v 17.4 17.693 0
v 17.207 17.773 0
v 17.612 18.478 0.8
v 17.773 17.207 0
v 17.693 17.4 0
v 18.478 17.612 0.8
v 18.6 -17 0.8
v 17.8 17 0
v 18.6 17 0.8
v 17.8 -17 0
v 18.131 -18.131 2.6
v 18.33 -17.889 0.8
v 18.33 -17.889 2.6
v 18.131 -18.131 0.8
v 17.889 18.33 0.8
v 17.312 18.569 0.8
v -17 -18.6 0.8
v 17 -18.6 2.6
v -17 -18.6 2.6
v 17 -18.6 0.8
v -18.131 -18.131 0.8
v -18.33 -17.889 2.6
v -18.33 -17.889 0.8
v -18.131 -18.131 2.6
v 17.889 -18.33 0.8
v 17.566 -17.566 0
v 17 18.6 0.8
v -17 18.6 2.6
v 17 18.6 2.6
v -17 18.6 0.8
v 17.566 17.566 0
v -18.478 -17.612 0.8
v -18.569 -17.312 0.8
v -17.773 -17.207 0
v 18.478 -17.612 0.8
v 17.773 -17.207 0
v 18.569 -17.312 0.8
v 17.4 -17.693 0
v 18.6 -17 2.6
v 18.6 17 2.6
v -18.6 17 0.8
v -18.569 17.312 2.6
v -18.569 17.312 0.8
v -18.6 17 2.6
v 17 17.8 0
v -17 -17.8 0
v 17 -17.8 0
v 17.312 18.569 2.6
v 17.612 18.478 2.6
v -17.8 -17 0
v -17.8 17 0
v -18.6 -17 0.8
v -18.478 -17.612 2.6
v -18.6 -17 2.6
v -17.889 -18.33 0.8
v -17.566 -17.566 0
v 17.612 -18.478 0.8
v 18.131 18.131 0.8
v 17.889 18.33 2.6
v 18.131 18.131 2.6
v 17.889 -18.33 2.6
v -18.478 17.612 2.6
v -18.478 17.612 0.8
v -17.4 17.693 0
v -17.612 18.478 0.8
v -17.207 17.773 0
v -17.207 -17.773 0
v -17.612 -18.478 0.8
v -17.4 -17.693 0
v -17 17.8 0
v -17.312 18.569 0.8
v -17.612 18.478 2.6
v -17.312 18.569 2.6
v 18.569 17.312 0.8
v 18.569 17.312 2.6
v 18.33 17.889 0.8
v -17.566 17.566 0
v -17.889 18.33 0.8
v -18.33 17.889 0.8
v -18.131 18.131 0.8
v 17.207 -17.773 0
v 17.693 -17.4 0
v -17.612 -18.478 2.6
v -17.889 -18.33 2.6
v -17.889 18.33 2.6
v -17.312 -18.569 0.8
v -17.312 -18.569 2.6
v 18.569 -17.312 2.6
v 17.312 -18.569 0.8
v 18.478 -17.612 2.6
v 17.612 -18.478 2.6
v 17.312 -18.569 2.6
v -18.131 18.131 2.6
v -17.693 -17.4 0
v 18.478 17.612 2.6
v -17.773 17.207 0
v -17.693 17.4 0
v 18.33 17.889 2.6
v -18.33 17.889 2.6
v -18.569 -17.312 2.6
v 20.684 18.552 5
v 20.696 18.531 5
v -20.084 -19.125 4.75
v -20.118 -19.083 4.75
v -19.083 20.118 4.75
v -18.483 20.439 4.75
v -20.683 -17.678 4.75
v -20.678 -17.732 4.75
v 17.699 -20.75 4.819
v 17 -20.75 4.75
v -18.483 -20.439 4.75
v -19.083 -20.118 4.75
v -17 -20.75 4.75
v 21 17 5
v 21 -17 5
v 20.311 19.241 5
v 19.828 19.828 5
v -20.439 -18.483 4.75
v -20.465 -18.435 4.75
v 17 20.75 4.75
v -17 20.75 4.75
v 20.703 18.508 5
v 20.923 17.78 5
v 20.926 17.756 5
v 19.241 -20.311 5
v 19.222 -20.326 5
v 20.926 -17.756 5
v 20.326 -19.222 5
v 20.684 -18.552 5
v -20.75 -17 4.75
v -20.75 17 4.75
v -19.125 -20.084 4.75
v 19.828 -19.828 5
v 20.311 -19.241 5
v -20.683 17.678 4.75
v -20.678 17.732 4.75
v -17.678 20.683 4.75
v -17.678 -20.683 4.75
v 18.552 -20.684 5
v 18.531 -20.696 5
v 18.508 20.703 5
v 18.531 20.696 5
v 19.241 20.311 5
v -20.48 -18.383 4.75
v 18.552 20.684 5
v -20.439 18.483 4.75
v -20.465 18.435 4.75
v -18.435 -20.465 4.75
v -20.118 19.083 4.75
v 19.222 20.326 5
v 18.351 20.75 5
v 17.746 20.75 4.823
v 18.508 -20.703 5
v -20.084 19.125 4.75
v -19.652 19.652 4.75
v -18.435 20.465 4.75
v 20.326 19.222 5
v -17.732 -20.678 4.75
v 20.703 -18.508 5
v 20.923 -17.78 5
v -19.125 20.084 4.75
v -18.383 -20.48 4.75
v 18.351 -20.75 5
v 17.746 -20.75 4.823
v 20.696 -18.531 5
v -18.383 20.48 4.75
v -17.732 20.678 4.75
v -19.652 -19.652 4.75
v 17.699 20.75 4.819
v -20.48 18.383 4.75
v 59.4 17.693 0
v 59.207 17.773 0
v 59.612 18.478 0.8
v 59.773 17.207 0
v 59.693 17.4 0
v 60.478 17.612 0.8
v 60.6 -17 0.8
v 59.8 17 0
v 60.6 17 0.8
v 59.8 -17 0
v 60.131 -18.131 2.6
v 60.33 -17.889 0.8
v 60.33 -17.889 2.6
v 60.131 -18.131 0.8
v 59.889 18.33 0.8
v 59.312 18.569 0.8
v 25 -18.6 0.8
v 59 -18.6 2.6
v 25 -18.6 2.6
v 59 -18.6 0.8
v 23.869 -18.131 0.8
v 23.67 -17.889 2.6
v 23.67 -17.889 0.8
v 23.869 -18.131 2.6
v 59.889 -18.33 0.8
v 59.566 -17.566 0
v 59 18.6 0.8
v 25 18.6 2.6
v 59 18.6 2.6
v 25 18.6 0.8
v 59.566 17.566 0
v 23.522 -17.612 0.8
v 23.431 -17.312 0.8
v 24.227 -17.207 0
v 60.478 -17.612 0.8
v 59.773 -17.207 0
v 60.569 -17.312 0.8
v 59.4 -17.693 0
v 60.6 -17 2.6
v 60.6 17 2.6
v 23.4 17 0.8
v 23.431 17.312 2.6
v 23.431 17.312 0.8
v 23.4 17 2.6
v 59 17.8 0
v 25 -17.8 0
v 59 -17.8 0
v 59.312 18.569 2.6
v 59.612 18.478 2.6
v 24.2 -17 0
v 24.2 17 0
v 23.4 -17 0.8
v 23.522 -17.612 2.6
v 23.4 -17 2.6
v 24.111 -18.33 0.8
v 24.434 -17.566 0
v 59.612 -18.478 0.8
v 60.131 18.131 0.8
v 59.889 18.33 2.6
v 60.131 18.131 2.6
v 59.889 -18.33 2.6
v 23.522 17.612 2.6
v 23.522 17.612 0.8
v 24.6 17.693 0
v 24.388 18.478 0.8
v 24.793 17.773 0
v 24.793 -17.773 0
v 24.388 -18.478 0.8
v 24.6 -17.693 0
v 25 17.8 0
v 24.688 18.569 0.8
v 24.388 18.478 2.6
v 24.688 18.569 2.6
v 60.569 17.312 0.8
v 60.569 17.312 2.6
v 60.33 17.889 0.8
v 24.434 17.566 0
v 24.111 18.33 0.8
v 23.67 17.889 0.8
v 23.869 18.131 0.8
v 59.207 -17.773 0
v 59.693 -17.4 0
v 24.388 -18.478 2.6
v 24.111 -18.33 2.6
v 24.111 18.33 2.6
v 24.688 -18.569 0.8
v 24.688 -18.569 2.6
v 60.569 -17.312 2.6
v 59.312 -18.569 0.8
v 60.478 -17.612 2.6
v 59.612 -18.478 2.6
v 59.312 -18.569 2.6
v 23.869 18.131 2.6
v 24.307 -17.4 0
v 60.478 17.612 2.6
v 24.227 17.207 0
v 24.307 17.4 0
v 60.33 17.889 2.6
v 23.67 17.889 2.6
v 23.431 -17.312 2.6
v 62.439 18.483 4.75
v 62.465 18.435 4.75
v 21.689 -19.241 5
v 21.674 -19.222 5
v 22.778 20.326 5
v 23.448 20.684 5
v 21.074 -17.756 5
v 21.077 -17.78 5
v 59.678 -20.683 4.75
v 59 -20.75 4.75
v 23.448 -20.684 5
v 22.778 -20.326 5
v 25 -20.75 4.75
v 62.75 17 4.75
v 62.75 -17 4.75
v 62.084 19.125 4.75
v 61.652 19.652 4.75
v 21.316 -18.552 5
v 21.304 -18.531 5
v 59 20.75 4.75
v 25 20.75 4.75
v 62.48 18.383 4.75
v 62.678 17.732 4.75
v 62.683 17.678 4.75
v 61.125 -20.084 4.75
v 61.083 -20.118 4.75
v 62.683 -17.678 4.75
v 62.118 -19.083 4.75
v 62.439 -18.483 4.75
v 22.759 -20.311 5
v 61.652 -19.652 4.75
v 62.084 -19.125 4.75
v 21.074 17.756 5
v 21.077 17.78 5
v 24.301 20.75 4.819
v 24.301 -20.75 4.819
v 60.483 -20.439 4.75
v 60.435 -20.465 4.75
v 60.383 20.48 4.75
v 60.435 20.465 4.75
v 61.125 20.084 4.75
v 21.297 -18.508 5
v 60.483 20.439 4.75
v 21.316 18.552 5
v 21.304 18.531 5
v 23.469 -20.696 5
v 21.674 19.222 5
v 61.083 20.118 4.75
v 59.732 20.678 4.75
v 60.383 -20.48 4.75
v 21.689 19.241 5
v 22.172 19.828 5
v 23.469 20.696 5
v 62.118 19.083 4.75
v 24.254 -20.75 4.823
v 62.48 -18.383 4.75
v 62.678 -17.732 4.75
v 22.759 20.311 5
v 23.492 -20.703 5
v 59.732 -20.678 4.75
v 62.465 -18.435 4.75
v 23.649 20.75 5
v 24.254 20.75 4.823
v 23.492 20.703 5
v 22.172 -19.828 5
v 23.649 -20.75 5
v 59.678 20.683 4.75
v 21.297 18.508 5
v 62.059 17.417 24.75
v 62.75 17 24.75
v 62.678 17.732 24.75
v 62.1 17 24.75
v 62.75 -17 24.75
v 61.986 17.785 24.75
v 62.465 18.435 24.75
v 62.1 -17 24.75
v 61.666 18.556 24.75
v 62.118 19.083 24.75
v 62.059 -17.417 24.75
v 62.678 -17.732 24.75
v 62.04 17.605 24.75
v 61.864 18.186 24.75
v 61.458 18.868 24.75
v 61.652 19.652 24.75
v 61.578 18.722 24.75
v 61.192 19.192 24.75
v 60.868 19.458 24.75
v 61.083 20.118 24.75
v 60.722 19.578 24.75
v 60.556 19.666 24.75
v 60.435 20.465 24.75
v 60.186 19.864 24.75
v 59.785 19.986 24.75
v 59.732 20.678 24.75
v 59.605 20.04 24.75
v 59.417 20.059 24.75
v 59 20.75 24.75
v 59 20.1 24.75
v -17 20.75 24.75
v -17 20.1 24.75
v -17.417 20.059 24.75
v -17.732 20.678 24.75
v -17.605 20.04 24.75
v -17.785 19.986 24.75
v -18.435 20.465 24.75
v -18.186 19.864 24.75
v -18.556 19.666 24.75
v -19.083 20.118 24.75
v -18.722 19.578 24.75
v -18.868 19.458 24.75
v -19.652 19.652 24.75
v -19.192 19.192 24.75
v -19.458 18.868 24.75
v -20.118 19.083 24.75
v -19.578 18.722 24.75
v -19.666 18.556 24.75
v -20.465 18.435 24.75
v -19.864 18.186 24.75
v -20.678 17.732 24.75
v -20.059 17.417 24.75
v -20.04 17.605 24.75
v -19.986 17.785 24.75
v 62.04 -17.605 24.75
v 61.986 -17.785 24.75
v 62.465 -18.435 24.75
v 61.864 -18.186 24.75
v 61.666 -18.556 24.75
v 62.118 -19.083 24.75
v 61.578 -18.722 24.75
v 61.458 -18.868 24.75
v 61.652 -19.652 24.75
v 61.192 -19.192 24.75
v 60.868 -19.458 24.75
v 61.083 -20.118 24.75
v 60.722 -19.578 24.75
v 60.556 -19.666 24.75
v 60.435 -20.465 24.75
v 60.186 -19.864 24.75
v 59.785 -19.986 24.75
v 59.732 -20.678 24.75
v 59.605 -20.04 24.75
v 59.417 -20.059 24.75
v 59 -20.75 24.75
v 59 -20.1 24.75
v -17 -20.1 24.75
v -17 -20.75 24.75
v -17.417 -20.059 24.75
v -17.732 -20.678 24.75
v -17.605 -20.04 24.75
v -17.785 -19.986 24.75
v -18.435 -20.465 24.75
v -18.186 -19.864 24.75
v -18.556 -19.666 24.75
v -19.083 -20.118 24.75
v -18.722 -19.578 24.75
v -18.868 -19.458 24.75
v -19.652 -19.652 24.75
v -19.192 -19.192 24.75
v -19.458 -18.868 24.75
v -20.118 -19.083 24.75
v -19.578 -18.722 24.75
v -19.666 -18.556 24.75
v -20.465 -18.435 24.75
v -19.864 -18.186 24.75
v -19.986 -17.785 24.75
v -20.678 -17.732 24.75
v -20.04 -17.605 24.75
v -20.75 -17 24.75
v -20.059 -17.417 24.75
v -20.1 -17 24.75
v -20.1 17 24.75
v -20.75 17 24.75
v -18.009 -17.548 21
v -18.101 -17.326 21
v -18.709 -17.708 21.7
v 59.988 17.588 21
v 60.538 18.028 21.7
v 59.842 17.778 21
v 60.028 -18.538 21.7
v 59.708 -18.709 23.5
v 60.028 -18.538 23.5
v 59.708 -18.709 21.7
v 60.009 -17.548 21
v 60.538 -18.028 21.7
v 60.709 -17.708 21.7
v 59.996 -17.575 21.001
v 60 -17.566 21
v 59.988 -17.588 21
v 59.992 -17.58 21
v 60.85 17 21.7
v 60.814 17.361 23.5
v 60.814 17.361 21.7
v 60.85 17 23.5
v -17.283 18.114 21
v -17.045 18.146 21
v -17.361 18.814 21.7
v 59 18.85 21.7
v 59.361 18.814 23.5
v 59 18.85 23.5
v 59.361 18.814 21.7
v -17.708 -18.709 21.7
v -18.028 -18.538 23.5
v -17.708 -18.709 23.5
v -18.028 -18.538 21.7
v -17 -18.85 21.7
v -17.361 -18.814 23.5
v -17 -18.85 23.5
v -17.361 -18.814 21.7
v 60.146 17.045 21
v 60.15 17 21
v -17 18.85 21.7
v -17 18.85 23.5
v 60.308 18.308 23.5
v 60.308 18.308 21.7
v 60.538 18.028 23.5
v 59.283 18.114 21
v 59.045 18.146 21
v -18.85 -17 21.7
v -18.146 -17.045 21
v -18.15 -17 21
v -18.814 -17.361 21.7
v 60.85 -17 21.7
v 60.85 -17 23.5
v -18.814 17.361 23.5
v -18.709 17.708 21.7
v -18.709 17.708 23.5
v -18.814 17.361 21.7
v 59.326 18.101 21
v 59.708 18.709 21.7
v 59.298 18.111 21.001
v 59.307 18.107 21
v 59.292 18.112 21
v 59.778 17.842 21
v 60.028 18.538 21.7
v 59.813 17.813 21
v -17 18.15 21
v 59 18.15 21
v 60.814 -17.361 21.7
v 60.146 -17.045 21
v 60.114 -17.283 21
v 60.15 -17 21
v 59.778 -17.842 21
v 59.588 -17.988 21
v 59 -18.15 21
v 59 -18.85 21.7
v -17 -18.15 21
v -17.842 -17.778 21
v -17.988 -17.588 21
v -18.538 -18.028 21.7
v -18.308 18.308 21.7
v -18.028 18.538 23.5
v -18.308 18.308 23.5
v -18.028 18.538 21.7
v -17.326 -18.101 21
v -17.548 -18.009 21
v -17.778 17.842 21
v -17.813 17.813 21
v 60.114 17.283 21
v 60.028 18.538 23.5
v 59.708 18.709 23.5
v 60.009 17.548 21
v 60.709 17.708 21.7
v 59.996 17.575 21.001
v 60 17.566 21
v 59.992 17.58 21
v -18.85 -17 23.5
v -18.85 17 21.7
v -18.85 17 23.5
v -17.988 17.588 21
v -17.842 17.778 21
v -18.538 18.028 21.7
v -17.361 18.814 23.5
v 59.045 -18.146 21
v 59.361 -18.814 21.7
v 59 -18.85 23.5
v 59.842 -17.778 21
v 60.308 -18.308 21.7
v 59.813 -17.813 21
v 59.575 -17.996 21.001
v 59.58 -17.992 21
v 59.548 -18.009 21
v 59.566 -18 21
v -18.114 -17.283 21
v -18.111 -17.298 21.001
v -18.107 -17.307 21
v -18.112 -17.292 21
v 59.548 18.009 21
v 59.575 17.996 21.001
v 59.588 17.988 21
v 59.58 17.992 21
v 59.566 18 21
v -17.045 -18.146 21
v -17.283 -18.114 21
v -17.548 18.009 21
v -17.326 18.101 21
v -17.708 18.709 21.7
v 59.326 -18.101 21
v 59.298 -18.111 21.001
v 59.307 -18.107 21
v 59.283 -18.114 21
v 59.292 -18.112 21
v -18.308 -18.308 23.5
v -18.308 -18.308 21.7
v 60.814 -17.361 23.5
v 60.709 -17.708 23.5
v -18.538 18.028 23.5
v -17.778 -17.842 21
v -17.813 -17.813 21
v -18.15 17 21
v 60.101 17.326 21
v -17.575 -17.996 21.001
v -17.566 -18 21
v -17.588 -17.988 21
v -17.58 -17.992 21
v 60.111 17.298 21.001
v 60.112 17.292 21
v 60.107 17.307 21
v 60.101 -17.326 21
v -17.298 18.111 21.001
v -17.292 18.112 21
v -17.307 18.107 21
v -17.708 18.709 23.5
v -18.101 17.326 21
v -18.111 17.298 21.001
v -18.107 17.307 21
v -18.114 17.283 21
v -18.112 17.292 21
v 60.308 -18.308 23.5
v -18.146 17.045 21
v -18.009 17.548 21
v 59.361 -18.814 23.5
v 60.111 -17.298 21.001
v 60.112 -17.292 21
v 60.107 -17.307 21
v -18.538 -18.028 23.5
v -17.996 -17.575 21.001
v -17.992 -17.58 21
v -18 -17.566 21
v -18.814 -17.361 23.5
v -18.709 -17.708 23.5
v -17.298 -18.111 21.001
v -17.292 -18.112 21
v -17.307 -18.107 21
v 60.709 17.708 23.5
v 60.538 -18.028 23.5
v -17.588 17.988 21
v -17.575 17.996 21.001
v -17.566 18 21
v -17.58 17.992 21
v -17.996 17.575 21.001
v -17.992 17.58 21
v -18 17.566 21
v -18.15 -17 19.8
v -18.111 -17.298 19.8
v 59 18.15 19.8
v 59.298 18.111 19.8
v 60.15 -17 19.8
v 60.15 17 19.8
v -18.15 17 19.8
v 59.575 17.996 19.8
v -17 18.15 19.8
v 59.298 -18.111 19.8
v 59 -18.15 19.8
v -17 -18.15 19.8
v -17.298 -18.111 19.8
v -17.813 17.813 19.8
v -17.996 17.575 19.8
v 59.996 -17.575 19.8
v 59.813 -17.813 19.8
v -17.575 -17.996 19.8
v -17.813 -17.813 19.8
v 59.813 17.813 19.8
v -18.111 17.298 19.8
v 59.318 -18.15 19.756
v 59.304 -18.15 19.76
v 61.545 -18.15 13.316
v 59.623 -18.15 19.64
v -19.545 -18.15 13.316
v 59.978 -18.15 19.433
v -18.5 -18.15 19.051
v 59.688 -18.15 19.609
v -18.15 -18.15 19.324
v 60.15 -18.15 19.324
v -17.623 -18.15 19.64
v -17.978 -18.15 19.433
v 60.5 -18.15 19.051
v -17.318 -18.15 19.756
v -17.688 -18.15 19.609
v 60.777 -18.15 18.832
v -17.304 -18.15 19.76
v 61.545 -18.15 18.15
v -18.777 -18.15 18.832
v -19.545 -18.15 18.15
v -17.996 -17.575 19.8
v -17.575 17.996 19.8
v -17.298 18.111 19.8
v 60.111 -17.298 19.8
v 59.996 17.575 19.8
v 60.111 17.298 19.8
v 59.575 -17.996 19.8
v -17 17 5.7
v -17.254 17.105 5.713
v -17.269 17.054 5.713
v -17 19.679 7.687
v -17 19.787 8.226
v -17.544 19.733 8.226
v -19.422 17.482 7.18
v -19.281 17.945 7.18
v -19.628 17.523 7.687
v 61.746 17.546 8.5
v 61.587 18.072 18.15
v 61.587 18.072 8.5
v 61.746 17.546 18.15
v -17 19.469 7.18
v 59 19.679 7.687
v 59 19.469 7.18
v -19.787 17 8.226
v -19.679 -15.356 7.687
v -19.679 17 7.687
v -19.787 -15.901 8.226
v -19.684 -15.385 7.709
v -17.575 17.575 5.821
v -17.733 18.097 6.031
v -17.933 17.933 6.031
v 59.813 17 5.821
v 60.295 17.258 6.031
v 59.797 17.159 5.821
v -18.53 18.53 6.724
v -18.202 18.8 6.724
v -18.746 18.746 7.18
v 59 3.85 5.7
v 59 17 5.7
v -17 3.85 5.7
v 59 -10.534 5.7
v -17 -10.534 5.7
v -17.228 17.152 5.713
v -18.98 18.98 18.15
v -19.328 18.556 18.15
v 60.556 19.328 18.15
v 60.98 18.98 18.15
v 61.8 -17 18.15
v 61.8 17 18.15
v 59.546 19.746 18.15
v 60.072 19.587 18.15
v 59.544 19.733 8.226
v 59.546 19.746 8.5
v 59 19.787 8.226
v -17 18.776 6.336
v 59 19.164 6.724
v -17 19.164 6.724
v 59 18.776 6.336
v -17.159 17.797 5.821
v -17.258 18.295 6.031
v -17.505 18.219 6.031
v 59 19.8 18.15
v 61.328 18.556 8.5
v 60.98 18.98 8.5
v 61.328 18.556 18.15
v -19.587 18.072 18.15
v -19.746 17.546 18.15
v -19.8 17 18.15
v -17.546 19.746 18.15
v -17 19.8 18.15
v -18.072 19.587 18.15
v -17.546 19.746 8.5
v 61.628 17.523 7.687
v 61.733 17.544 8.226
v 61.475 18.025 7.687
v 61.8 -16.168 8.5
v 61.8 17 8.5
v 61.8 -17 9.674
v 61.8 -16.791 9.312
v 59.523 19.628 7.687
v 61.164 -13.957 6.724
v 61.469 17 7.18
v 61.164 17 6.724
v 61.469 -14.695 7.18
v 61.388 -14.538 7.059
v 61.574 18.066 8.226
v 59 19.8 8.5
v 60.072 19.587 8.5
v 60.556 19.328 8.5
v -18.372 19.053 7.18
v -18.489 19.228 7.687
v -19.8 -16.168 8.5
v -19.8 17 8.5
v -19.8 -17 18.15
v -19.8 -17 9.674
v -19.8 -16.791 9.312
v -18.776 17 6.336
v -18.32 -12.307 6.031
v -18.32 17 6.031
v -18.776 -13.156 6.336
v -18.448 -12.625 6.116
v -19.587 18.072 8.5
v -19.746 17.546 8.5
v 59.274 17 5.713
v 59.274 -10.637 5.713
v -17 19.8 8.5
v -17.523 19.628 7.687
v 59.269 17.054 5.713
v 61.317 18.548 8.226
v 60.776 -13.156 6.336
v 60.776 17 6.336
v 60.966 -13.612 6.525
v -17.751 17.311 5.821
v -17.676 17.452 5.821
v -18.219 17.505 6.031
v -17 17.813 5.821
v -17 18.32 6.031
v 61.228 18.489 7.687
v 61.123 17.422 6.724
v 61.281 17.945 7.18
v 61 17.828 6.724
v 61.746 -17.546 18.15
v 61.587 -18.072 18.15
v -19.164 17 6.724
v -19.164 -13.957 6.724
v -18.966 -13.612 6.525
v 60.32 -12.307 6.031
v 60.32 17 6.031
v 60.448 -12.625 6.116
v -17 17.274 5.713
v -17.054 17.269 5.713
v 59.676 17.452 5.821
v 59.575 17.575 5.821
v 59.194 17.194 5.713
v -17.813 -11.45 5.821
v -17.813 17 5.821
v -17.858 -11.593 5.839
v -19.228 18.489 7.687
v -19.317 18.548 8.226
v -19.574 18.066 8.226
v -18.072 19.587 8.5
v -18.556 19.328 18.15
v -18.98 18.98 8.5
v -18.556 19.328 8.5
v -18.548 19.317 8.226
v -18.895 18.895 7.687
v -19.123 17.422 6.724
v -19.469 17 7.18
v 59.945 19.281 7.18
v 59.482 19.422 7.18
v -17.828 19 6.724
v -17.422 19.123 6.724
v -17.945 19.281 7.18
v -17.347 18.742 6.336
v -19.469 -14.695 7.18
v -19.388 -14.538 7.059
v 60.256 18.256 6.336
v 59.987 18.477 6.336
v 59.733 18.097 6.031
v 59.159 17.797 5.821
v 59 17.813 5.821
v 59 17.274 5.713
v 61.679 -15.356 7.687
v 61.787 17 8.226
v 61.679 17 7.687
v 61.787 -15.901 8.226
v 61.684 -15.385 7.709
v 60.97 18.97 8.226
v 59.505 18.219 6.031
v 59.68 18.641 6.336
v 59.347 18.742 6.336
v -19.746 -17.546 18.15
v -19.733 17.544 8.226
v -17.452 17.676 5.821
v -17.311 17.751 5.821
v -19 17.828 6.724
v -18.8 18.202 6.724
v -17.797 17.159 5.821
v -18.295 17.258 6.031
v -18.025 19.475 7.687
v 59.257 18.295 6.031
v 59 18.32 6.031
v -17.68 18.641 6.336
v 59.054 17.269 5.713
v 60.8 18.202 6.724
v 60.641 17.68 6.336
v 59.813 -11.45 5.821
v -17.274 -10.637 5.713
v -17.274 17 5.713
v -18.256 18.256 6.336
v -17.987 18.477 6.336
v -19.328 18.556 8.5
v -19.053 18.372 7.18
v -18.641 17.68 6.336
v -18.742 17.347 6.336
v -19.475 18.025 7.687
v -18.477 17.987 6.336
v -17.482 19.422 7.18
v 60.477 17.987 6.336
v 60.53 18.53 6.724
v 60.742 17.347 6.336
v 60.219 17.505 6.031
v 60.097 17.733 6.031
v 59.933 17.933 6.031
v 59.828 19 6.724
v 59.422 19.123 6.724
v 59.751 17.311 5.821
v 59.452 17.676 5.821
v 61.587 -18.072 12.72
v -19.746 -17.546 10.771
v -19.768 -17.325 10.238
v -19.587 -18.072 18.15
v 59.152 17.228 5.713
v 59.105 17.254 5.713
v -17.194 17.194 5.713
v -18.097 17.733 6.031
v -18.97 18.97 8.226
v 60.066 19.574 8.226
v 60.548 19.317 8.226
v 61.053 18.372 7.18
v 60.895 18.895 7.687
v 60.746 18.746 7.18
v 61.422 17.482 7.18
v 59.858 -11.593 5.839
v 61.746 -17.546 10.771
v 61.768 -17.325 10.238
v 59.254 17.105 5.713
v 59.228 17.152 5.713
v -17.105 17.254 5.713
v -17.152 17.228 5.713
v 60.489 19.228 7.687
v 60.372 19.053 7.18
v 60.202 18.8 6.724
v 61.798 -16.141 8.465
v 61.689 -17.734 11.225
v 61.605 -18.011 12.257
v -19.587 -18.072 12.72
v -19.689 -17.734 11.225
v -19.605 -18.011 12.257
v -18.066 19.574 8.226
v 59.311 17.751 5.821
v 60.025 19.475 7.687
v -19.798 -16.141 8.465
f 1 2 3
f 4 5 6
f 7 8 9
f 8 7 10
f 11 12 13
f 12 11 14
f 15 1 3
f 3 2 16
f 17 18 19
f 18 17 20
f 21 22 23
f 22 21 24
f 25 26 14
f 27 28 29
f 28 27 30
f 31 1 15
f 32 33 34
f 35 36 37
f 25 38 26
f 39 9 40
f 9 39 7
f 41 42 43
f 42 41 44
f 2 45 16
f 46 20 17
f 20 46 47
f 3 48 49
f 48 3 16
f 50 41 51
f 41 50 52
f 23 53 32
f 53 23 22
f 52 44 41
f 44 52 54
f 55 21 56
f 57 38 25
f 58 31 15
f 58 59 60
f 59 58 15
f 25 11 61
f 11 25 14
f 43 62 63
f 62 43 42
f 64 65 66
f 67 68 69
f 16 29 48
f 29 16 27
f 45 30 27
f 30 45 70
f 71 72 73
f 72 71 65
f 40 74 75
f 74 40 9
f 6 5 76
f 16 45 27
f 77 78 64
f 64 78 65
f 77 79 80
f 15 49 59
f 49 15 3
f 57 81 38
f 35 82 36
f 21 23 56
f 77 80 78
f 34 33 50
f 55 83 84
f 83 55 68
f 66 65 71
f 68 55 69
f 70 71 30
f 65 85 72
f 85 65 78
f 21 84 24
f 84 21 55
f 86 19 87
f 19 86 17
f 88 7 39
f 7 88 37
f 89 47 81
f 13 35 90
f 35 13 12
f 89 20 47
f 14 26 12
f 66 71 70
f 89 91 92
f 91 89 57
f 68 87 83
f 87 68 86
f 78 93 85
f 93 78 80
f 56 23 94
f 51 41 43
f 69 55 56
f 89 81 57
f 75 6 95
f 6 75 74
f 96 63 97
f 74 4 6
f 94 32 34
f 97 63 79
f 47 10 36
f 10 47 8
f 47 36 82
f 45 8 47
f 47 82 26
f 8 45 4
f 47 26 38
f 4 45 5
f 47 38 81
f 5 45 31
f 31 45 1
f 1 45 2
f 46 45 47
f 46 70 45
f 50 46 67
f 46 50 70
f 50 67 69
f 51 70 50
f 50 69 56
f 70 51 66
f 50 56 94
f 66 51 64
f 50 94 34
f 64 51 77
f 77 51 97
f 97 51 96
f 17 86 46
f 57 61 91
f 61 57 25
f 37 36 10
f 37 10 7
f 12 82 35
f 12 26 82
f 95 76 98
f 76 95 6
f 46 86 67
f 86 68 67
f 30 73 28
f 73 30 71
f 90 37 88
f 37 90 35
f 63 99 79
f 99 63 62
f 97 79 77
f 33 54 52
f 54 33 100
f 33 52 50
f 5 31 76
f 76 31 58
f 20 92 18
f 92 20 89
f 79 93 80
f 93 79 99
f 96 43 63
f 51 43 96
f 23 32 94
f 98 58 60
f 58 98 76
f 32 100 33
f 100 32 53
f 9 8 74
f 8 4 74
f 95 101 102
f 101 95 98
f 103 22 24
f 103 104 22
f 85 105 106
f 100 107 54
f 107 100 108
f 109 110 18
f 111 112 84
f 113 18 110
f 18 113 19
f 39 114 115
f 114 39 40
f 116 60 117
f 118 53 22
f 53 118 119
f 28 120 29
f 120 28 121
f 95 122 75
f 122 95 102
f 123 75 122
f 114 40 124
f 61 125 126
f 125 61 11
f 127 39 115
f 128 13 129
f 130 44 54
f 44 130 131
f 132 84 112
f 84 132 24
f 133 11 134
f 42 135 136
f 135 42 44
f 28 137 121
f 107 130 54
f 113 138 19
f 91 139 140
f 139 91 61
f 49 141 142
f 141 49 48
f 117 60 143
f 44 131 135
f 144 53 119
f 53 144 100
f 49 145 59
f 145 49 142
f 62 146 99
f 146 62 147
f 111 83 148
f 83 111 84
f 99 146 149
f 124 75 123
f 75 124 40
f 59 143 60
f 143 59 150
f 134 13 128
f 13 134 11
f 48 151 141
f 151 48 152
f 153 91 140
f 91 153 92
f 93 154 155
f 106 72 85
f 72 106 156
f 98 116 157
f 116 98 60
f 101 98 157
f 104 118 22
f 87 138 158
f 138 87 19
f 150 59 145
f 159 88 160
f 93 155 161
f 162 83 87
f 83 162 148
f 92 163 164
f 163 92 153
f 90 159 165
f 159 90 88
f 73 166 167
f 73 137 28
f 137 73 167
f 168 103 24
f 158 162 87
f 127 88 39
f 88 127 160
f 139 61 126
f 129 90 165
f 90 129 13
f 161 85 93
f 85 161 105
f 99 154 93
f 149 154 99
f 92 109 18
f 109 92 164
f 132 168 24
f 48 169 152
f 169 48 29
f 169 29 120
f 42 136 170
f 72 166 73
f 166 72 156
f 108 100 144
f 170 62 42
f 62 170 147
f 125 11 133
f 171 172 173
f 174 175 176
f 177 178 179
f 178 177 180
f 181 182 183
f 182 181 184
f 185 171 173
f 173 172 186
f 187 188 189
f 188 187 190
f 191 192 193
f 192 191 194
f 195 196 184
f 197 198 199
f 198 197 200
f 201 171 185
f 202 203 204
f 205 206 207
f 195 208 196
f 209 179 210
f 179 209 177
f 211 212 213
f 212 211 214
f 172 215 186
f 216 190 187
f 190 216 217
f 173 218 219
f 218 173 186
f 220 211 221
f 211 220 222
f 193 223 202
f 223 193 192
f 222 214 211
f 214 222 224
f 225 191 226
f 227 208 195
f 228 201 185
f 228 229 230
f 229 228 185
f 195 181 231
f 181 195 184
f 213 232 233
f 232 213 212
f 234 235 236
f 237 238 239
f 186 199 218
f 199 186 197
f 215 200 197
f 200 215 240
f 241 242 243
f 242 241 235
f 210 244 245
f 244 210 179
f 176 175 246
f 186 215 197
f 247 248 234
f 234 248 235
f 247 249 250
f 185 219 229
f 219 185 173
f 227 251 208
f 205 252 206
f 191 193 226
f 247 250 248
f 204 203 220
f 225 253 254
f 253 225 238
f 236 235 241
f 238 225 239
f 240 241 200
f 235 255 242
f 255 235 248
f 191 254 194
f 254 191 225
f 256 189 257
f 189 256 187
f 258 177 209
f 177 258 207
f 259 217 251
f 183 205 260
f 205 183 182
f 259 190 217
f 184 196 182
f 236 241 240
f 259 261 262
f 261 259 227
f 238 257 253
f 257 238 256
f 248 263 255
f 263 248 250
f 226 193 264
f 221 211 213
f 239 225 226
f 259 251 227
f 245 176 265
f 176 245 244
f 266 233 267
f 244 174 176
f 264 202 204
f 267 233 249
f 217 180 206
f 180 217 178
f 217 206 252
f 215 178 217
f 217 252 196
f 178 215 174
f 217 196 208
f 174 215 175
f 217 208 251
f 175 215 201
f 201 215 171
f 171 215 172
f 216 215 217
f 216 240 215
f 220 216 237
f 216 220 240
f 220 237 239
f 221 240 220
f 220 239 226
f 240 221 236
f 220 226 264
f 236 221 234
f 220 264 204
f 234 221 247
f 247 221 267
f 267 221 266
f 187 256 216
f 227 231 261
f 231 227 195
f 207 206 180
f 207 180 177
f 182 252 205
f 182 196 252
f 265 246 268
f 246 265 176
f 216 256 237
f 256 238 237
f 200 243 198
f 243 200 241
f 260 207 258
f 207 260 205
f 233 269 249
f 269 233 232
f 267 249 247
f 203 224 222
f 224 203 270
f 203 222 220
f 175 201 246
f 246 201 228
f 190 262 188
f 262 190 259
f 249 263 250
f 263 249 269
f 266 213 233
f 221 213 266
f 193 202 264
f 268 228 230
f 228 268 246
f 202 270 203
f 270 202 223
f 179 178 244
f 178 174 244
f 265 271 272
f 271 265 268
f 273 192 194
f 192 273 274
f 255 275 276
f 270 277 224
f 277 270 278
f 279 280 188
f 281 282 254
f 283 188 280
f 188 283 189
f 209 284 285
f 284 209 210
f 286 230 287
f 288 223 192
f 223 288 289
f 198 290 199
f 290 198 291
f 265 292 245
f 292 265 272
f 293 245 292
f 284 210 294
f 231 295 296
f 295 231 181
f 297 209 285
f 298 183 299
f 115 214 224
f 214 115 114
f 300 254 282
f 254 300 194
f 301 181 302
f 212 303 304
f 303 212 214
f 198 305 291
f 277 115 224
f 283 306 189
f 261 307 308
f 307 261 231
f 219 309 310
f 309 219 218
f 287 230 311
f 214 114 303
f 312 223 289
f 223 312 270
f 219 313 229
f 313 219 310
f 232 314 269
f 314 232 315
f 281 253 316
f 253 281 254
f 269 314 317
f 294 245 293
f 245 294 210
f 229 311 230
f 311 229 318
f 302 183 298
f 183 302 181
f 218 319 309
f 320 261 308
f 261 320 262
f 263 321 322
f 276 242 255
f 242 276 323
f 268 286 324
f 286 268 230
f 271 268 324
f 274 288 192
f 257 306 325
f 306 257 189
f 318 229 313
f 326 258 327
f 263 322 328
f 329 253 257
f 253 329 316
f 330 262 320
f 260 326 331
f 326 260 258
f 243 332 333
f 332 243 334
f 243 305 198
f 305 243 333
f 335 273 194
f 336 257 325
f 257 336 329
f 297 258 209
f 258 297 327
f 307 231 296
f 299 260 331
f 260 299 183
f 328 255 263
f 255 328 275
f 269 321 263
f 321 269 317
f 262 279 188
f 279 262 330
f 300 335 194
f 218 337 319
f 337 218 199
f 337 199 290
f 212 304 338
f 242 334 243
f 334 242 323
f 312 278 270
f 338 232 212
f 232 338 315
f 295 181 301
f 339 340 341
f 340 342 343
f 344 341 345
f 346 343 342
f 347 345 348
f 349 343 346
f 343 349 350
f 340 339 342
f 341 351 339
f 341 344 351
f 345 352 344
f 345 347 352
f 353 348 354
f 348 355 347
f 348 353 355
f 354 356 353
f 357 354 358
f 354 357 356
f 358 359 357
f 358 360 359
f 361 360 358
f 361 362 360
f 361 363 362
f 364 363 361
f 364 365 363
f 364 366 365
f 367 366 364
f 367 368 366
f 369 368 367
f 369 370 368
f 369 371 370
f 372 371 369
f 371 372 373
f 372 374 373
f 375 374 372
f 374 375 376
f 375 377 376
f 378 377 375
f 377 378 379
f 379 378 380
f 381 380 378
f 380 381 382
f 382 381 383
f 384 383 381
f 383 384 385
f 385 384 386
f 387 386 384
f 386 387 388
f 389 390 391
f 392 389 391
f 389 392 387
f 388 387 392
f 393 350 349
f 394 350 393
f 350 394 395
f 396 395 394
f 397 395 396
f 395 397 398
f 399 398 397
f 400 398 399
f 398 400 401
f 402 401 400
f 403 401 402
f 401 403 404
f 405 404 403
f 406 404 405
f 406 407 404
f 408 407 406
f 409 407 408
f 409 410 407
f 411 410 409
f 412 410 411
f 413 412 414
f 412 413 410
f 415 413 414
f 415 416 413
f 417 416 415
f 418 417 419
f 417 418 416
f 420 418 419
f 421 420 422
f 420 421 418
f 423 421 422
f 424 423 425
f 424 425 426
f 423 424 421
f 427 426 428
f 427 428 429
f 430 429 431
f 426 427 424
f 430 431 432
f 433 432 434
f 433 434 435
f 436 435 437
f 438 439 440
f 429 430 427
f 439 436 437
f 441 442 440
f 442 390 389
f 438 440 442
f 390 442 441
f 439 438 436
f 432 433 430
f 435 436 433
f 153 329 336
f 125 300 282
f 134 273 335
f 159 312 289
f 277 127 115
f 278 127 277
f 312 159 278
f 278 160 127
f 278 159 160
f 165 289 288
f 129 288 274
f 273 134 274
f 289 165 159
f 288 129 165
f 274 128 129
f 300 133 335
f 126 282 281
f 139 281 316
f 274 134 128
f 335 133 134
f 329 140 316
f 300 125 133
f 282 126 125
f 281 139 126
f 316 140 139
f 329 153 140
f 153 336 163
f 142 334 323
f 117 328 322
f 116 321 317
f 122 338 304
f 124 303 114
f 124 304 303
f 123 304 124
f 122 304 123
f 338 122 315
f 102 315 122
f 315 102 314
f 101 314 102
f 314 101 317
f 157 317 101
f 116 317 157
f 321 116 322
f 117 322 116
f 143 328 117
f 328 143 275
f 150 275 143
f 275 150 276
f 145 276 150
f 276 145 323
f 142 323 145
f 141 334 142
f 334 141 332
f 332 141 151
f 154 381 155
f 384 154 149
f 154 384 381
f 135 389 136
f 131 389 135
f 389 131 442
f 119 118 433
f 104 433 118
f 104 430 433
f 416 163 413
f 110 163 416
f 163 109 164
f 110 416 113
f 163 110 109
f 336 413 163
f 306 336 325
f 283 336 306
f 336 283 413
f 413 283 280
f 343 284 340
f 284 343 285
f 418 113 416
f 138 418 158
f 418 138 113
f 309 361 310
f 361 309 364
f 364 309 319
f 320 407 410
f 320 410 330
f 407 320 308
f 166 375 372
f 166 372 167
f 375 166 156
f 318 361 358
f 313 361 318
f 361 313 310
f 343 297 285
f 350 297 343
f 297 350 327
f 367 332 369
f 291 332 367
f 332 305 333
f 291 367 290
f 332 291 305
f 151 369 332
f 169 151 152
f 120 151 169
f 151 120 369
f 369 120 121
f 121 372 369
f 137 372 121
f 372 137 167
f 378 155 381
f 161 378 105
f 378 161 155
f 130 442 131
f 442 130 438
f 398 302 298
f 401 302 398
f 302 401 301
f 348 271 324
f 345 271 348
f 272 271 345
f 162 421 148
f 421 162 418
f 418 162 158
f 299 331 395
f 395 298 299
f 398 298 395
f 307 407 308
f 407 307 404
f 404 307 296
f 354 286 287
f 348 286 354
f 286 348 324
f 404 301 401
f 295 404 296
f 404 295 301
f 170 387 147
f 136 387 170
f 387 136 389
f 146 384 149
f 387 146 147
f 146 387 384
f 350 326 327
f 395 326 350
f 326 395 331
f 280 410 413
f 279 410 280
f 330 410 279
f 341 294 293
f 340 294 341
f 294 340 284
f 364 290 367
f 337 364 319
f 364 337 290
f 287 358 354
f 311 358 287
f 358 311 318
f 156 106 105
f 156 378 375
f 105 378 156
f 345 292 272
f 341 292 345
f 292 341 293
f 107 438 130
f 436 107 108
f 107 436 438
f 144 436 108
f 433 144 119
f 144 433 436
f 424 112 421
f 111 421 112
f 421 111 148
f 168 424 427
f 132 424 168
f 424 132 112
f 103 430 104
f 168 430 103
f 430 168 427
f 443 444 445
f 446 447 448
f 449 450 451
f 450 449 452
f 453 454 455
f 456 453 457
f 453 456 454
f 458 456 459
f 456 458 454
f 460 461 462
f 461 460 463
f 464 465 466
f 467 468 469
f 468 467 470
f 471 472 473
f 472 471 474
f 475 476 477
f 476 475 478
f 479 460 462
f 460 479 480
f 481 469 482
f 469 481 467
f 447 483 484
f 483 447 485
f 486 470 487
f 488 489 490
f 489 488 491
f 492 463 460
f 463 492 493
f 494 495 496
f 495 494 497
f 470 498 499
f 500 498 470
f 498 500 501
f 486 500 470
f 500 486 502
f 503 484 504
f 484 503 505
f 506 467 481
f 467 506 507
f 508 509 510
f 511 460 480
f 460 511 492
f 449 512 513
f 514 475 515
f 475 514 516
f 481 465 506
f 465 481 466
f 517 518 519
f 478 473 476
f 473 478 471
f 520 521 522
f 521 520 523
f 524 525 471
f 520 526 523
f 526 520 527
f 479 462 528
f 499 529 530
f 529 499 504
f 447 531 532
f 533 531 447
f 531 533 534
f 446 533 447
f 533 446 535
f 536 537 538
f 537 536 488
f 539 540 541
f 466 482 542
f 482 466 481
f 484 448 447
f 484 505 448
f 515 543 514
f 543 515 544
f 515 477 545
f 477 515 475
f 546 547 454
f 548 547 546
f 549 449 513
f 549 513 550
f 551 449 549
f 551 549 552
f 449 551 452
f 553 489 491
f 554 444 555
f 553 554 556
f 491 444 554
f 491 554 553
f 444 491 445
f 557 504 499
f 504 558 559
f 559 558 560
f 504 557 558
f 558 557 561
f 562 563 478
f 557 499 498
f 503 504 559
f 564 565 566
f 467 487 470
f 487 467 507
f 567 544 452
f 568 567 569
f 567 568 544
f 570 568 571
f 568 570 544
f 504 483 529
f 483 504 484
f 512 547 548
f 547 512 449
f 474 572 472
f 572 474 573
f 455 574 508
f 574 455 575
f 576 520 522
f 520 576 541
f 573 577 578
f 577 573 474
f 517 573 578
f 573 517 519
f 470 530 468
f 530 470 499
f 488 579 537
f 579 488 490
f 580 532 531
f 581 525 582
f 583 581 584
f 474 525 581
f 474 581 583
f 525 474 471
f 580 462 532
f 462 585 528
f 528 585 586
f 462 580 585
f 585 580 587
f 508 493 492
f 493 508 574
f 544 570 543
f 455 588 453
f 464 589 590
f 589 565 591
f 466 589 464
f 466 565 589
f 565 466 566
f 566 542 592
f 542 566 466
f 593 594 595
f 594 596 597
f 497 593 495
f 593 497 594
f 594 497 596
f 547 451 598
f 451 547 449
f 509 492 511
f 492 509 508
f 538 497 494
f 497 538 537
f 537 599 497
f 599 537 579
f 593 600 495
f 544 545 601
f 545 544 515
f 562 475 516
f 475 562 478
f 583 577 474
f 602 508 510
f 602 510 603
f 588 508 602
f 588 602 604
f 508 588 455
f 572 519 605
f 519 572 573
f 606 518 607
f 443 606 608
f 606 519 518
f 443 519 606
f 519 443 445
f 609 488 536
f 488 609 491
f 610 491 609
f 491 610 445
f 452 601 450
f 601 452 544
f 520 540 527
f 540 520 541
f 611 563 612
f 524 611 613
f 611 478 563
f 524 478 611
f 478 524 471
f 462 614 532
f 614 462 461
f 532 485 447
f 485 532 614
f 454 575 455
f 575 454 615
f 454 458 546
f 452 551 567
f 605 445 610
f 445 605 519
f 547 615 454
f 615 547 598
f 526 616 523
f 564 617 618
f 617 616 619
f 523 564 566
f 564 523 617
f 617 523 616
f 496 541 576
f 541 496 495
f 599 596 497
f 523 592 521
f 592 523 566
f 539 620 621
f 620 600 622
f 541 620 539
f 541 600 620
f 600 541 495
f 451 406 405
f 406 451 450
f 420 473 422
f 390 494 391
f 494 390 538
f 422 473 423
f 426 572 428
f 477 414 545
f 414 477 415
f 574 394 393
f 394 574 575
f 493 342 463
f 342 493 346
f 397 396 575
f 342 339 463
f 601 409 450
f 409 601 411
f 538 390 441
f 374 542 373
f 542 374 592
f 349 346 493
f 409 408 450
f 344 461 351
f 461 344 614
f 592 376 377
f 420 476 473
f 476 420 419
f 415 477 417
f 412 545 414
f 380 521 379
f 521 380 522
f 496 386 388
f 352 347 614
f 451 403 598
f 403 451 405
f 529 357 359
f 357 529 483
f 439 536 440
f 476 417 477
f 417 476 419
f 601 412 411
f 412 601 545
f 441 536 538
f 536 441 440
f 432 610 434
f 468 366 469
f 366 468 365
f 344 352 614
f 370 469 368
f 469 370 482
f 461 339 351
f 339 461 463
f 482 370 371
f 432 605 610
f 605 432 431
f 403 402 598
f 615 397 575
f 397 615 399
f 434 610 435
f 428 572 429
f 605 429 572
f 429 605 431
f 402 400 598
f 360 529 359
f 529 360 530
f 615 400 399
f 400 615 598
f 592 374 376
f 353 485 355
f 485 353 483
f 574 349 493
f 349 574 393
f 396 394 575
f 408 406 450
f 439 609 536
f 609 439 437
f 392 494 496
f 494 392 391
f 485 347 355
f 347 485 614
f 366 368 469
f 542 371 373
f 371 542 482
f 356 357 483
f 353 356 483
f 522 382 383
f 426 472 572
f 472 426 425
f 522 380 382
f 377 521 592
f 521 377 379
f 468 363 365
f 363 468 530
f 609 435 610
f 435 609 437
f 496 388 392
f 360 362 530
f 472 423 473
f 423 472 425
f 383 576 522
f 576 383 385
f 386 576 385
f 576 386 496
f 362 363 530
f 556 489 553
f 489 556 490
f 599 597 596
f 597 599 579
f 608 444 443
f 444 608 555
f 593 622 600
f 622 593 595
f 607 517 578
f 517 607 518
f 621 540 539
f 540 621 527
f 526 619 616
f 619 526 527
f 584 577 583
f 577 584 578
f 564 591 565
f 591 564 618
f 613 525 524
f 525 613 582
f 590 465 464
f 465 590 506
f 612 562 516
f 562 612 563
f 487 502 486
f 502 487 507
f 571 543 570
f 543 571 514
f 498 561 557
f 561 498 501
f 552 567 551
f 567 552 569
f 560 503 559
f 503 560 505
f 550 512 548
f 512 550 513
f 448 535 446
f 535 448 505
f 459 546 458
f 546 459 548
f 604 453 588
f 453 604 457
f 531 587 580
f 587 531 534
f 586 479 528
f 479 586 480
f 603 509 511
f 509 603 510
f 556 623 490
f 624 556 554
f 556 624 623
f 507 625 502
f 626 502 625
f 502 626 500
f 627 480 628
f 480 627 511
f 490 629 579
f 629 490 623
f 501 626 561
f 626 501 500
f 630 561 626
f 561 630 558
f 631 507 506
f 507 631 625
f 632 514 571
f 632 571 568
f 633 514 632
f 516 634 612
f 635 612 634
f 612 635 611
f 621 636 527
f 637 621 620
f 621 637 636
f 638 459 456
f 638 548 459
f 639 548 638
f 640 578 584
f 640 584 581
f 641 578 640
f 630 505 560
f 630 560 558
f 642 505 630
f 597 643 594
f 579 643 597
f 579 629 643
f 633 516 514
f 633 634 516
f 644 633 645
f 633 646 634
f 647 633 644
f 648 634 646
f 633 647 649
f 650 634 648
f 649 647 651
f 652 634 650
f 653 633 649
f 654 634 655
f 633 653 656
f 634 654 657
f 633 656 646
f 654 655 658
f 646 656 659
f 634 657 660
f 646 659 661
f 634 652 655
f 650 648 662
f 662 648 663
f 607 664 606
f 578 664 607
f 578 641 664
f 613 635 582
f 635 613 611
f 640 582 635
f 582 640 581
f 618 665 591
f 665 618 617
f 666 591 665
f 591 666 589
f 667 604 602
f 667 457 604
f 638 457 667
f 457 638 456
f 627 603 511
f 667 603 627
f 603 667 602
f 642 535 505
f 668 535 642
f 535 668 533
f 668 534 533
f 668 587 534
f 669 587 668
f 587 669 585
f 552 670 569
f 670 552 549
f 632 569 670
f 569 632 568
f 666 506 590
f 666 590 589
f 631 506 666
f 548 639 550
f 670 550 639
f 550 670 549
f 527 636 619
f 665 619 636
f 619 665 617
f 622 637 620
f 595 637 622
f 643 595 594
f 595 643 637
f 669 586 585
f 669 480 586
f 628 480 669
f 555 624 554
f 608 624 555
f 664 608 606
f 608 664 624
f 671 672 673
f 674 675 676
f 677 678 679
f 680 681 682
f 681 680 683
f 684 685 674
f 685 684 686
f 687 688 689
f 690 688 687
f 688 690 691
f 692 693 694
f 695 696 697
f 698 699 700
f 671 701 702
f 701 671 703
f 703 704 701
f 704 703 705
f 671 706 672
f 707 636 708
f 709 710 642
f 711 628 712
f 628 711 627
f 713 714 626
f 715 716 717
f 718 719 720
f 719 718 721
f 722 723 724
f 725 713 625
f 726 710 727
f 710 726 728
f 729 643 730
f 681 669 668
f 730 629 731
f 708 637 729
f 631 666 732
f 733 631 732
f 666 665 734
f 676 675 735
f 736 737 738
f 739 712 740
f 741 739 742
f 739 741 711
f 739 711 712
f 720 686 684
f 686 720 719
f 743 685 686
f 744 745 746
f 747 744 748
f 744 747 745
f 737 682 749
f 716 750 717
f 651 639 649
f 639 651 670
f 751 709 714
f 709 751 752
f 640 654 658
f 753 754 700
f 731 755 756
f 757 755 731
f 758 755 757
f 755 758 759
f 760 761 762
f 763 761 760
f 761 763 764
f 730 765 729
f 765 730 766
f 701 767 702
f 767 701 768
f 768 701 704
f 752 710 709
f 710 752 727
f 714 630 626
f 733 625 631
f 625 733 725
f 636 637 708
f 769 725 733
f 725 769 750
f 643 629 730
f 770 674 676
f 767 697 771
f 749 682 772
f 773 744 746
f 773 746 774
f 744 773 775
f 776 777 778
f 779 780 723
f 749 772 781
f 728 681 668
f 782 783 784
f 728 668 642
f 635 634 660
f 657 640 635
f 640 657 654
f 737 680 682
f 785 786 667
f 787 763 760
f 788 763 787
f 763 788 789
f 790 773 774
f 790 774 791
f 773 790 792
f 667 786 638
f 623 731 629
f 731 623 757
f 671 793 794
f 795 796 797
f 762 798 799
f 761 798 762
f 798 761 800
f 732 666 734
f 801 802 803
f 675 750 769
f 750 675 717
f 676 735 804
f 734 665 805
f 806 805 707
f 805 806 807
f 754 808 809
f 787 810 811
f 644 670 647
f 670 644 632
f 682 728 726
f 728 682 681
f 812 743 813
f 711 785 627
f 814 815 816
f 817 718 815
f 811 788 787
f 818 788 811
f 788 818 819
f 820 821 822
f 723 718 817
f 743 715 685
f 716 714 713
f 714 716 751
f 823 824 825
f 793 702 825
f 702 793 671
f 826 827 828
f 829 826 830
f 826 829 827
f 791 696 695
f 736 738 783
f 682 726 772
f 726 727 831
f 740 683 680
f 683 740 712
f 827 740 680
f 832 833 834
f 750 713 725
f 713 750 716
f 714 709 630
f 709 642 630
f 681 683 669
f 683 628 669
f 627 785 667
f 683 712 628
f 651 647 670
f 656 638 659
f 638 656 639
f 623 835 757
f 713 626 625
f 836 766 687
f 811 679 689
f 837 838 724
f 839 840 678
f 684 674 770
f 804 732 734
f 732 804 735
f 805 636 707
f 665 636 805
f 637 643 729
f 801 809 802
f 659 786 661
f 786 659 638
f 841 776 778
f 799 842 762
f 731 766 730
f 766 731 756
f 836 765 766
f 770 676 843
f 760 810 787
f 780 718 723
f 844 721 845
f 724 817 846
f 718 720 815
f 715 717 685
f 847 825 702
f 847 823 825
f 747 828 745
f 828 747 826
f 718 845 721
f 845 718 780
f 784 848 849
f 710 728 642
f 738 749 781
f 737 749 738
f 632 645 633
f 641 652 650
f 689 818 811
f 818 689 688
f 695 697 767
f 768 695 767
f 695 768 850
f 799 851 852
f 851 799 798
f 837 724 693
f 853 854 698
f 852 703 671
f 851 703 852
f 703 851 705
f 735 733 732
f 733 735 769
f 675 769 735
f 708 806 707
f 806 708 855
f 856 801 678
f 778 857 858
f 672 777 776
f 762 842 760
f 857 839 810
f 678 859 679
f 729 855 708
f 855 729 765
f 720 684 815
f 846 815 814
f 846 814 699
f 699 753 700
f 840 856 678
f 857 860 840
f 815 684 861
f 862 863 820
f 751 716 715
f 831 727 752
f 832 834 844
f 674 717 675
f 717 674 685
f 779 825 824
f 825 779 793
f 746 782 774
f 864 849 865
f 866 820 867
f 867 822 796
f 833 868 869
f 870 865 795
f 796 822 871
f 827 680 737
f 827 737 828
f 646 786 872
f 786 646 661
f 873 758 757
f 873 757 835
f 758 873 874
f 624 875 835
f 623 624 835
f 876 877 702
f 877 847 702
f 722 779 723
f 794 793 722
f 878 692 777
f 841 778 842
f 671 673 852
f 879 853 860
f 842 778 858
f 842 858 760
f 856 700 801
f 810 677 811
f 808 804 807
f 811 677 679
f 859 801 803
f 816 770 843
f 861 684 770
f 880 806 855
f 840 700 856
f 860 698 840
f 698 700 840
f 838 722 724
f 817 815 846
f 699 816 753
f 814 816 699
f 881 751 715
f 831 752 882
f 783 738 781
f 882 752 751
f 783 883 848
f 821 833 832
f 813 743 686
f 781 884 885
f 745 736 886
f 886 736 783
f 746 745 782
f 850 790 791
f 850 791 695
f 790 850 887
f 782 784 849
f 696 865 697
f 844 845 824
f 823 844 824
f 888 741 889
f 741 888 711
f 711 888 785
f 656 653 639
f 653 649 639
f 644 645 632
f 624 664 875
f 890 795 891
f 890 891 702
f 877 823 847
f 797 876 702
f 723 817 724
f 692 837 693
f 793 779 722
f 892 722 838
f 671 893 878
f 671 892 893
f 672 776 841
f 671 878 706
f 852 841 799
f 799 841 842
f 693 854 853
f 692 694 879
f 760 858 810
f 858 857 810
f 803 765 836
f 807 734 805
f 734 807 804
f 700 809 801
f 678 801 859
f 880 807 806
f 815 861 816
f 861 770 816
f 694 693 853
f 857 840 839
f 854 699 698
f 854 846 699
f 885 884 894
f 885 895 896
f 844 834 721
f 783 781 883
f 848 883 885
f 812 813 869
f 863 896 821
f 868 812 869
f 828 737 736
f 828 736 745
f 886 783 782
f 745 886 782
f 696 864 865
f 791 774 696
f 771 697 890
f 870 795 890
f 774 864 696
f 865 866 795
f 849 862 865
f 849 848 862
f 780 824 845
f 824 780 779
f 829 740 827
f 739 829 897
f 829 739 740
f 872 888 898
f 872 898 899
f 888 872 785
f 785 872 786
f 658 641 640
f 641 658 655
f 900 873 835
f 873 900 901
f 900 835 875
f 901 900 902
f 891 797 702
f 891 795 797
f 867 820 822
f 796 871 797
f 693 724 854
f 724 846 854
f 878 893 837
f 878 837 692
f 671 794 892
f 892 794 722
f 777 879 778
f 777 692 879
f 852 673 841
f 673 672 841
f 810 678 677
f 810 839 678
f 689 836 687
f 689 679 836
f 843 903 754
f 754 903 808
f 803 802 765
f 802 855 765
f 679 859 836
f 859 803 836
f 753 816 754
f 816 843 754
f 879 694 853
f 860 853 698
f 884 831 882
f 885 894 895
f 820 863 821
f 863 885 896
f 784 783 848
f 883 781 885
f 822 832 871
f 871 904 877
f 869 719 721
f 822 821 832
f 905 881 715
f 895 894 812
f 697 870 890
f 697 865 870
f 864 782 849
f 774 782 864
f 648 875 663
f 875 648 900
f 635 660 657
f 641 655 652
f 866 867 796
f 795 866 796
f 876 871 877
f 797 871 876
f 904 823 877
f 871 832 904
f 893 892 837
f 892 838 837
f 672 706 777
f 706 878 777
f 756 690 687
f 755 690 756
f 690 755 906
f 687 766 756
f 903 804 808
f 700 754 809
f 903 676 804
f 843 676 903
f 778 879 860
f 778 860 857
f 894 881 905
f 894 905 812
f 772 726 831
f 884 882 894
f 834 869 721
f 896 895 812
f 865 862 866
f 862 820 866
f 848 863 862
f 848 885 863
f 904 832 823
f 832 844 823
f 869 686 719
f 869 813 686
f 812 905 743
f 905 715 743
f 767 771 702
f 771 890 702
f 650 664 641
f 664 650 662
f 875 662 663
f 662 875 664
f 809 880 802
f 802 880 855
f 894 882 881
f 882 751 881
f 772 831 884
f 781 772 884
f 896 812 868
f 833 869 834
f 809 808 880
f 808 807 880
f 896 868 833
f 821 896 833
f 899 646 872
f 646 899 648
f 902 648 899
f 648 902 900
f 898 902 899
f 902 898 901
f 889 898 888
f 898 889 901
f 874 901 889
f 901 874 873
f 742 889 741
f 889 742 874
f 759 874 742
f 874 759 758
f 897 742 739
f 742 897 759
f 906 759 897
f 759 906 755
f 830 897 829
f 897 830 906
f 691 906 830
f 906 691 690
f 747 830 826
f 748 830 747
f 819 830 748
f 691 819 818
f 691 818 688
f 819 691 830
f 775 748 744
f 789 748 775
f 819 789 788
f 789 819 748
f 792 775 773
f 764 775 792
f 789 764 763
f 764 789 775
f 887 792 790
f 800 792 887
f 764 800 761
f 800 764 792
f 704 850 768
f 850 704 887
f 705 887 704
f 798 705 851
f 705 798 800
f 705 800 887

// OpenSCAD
// include <gridfinity_modules.scad>
use <gridfinity_cup_modules.scad>

// X dimension in grid units
width = 2; // [ 0.5, 1, 2, 3, 4, 5, 6, 7, 8, 9, 10, 11, 12, 13 ]
// Y dimension in grid units
depth = 1; // [ 1, 2, 3, 4, 5, 6, 7, 8, 9, 10, 11, 12, 13 ]
// Z dimension (multiples of 7mm)
height = 3;
// (Zack's design uses magnet diameter of 6.5)
magnet_diameter = 0;  // .1
// (Zack's design uses depth of 6)
screw_depth = 0;
// Hole overhang remedy is active only when both screws and magnets are nonzero (and this option is selected)
hole_overhang_remedy = true;
//Only add attachments (magnets and screw) to box corners (prints faster).
box_corner_attachments_only = false;
// Fill in solid block (overrides all following options)
filled_in = false;
// X dimension subdivisions
chambers = 1;
// Include overhang for labeling (and specify left/right/center justification)
withLabel = "disabled"; // ["disabled", "left", "right", "center", "leftchamber", "rightchamber", "centerchamber"]
// Include larger corner fillet
fingerslide = true;
// Width of the label in number of units, or zero means full width
labelWidth = 0;  // .01
// Minimum thickness above cutouts in base (Zack's design is effectively 1.2)
floor_thickness = 0.7;
// Wall thickness (Zack's design is 0.95)
wall_thickness = 0.95;  // .01
// Efficient floor option saves material and time, but the floor is not smooth (only applies if no magnets, screws, or finger-slide used)
efficient_floor = false;
// When enabled, irregular subdivisions have to be defined in code
irregular_subdivisions = false;
// Enable to subdivide bottom pads to allow half-cell offsets
half_pitch = false;
// Remove some or all of lip
lip_style = "normal";  // [ "normal", "reduced", "none" ]

module end_of_customizer_opts() {}

// Separator positions are defined in terms of grid units from the left end
separator_positions = [ 0.25, 0.5, 1.4 ];

if (filled_in) {
  grid_block(width, depth, height, magnet_diameter=magnet_diameter, 
    screw_depth=screw_depth, hole_overhang_remedy=hole_overhang_remedy,
    half_pitch=half_pitch, box_corner_attachments_only=box_corner_attachments_only);
}
else if (irregular_subdivisions) {
  irregular_cup(
    num_x=width,
    num_y=depth,
    num_z=height,
    withLabel=withLabel,
    labelWidth=labelWidth,
    fingerslide=fingerslide,
    magnet_diameter=magnet_diameter,
    screw_depth=screw_depth,
    floor_thickness=floor_thickness,
    wall_thickness=wall_thickness,
    hole_overhang_remedy=hole_overhang_remedy,
    separator_positions=separator_positions,
    half_pitch=half_pitch,
    lip_style=lip_style,
    box_corner_attachments_only=box_corner_attachments_only
  );
}
else {
  basic_cup(
    num_x=width,
    num_y=depth,
    num_z=height,
    chambers=chambers,
    withLabel=withLabel,
    labelWidth=labelWidth,
    fingerslide=fingerslide,
    magnet_diameter=magnet_diameter,
    screw_depth=screw_depth,
    floor_thickness=floor_thickness,
    wall_thickness=wall_thickness,
    hole_overhang_remedy=hole_overhang_remedy,
    efficient_floor=efficient_floor,
    half_pitch=half_pitch,
    lip_style=lip_style,
    box_corner_attachments_only=box_corner_attachments_only
  );
}
